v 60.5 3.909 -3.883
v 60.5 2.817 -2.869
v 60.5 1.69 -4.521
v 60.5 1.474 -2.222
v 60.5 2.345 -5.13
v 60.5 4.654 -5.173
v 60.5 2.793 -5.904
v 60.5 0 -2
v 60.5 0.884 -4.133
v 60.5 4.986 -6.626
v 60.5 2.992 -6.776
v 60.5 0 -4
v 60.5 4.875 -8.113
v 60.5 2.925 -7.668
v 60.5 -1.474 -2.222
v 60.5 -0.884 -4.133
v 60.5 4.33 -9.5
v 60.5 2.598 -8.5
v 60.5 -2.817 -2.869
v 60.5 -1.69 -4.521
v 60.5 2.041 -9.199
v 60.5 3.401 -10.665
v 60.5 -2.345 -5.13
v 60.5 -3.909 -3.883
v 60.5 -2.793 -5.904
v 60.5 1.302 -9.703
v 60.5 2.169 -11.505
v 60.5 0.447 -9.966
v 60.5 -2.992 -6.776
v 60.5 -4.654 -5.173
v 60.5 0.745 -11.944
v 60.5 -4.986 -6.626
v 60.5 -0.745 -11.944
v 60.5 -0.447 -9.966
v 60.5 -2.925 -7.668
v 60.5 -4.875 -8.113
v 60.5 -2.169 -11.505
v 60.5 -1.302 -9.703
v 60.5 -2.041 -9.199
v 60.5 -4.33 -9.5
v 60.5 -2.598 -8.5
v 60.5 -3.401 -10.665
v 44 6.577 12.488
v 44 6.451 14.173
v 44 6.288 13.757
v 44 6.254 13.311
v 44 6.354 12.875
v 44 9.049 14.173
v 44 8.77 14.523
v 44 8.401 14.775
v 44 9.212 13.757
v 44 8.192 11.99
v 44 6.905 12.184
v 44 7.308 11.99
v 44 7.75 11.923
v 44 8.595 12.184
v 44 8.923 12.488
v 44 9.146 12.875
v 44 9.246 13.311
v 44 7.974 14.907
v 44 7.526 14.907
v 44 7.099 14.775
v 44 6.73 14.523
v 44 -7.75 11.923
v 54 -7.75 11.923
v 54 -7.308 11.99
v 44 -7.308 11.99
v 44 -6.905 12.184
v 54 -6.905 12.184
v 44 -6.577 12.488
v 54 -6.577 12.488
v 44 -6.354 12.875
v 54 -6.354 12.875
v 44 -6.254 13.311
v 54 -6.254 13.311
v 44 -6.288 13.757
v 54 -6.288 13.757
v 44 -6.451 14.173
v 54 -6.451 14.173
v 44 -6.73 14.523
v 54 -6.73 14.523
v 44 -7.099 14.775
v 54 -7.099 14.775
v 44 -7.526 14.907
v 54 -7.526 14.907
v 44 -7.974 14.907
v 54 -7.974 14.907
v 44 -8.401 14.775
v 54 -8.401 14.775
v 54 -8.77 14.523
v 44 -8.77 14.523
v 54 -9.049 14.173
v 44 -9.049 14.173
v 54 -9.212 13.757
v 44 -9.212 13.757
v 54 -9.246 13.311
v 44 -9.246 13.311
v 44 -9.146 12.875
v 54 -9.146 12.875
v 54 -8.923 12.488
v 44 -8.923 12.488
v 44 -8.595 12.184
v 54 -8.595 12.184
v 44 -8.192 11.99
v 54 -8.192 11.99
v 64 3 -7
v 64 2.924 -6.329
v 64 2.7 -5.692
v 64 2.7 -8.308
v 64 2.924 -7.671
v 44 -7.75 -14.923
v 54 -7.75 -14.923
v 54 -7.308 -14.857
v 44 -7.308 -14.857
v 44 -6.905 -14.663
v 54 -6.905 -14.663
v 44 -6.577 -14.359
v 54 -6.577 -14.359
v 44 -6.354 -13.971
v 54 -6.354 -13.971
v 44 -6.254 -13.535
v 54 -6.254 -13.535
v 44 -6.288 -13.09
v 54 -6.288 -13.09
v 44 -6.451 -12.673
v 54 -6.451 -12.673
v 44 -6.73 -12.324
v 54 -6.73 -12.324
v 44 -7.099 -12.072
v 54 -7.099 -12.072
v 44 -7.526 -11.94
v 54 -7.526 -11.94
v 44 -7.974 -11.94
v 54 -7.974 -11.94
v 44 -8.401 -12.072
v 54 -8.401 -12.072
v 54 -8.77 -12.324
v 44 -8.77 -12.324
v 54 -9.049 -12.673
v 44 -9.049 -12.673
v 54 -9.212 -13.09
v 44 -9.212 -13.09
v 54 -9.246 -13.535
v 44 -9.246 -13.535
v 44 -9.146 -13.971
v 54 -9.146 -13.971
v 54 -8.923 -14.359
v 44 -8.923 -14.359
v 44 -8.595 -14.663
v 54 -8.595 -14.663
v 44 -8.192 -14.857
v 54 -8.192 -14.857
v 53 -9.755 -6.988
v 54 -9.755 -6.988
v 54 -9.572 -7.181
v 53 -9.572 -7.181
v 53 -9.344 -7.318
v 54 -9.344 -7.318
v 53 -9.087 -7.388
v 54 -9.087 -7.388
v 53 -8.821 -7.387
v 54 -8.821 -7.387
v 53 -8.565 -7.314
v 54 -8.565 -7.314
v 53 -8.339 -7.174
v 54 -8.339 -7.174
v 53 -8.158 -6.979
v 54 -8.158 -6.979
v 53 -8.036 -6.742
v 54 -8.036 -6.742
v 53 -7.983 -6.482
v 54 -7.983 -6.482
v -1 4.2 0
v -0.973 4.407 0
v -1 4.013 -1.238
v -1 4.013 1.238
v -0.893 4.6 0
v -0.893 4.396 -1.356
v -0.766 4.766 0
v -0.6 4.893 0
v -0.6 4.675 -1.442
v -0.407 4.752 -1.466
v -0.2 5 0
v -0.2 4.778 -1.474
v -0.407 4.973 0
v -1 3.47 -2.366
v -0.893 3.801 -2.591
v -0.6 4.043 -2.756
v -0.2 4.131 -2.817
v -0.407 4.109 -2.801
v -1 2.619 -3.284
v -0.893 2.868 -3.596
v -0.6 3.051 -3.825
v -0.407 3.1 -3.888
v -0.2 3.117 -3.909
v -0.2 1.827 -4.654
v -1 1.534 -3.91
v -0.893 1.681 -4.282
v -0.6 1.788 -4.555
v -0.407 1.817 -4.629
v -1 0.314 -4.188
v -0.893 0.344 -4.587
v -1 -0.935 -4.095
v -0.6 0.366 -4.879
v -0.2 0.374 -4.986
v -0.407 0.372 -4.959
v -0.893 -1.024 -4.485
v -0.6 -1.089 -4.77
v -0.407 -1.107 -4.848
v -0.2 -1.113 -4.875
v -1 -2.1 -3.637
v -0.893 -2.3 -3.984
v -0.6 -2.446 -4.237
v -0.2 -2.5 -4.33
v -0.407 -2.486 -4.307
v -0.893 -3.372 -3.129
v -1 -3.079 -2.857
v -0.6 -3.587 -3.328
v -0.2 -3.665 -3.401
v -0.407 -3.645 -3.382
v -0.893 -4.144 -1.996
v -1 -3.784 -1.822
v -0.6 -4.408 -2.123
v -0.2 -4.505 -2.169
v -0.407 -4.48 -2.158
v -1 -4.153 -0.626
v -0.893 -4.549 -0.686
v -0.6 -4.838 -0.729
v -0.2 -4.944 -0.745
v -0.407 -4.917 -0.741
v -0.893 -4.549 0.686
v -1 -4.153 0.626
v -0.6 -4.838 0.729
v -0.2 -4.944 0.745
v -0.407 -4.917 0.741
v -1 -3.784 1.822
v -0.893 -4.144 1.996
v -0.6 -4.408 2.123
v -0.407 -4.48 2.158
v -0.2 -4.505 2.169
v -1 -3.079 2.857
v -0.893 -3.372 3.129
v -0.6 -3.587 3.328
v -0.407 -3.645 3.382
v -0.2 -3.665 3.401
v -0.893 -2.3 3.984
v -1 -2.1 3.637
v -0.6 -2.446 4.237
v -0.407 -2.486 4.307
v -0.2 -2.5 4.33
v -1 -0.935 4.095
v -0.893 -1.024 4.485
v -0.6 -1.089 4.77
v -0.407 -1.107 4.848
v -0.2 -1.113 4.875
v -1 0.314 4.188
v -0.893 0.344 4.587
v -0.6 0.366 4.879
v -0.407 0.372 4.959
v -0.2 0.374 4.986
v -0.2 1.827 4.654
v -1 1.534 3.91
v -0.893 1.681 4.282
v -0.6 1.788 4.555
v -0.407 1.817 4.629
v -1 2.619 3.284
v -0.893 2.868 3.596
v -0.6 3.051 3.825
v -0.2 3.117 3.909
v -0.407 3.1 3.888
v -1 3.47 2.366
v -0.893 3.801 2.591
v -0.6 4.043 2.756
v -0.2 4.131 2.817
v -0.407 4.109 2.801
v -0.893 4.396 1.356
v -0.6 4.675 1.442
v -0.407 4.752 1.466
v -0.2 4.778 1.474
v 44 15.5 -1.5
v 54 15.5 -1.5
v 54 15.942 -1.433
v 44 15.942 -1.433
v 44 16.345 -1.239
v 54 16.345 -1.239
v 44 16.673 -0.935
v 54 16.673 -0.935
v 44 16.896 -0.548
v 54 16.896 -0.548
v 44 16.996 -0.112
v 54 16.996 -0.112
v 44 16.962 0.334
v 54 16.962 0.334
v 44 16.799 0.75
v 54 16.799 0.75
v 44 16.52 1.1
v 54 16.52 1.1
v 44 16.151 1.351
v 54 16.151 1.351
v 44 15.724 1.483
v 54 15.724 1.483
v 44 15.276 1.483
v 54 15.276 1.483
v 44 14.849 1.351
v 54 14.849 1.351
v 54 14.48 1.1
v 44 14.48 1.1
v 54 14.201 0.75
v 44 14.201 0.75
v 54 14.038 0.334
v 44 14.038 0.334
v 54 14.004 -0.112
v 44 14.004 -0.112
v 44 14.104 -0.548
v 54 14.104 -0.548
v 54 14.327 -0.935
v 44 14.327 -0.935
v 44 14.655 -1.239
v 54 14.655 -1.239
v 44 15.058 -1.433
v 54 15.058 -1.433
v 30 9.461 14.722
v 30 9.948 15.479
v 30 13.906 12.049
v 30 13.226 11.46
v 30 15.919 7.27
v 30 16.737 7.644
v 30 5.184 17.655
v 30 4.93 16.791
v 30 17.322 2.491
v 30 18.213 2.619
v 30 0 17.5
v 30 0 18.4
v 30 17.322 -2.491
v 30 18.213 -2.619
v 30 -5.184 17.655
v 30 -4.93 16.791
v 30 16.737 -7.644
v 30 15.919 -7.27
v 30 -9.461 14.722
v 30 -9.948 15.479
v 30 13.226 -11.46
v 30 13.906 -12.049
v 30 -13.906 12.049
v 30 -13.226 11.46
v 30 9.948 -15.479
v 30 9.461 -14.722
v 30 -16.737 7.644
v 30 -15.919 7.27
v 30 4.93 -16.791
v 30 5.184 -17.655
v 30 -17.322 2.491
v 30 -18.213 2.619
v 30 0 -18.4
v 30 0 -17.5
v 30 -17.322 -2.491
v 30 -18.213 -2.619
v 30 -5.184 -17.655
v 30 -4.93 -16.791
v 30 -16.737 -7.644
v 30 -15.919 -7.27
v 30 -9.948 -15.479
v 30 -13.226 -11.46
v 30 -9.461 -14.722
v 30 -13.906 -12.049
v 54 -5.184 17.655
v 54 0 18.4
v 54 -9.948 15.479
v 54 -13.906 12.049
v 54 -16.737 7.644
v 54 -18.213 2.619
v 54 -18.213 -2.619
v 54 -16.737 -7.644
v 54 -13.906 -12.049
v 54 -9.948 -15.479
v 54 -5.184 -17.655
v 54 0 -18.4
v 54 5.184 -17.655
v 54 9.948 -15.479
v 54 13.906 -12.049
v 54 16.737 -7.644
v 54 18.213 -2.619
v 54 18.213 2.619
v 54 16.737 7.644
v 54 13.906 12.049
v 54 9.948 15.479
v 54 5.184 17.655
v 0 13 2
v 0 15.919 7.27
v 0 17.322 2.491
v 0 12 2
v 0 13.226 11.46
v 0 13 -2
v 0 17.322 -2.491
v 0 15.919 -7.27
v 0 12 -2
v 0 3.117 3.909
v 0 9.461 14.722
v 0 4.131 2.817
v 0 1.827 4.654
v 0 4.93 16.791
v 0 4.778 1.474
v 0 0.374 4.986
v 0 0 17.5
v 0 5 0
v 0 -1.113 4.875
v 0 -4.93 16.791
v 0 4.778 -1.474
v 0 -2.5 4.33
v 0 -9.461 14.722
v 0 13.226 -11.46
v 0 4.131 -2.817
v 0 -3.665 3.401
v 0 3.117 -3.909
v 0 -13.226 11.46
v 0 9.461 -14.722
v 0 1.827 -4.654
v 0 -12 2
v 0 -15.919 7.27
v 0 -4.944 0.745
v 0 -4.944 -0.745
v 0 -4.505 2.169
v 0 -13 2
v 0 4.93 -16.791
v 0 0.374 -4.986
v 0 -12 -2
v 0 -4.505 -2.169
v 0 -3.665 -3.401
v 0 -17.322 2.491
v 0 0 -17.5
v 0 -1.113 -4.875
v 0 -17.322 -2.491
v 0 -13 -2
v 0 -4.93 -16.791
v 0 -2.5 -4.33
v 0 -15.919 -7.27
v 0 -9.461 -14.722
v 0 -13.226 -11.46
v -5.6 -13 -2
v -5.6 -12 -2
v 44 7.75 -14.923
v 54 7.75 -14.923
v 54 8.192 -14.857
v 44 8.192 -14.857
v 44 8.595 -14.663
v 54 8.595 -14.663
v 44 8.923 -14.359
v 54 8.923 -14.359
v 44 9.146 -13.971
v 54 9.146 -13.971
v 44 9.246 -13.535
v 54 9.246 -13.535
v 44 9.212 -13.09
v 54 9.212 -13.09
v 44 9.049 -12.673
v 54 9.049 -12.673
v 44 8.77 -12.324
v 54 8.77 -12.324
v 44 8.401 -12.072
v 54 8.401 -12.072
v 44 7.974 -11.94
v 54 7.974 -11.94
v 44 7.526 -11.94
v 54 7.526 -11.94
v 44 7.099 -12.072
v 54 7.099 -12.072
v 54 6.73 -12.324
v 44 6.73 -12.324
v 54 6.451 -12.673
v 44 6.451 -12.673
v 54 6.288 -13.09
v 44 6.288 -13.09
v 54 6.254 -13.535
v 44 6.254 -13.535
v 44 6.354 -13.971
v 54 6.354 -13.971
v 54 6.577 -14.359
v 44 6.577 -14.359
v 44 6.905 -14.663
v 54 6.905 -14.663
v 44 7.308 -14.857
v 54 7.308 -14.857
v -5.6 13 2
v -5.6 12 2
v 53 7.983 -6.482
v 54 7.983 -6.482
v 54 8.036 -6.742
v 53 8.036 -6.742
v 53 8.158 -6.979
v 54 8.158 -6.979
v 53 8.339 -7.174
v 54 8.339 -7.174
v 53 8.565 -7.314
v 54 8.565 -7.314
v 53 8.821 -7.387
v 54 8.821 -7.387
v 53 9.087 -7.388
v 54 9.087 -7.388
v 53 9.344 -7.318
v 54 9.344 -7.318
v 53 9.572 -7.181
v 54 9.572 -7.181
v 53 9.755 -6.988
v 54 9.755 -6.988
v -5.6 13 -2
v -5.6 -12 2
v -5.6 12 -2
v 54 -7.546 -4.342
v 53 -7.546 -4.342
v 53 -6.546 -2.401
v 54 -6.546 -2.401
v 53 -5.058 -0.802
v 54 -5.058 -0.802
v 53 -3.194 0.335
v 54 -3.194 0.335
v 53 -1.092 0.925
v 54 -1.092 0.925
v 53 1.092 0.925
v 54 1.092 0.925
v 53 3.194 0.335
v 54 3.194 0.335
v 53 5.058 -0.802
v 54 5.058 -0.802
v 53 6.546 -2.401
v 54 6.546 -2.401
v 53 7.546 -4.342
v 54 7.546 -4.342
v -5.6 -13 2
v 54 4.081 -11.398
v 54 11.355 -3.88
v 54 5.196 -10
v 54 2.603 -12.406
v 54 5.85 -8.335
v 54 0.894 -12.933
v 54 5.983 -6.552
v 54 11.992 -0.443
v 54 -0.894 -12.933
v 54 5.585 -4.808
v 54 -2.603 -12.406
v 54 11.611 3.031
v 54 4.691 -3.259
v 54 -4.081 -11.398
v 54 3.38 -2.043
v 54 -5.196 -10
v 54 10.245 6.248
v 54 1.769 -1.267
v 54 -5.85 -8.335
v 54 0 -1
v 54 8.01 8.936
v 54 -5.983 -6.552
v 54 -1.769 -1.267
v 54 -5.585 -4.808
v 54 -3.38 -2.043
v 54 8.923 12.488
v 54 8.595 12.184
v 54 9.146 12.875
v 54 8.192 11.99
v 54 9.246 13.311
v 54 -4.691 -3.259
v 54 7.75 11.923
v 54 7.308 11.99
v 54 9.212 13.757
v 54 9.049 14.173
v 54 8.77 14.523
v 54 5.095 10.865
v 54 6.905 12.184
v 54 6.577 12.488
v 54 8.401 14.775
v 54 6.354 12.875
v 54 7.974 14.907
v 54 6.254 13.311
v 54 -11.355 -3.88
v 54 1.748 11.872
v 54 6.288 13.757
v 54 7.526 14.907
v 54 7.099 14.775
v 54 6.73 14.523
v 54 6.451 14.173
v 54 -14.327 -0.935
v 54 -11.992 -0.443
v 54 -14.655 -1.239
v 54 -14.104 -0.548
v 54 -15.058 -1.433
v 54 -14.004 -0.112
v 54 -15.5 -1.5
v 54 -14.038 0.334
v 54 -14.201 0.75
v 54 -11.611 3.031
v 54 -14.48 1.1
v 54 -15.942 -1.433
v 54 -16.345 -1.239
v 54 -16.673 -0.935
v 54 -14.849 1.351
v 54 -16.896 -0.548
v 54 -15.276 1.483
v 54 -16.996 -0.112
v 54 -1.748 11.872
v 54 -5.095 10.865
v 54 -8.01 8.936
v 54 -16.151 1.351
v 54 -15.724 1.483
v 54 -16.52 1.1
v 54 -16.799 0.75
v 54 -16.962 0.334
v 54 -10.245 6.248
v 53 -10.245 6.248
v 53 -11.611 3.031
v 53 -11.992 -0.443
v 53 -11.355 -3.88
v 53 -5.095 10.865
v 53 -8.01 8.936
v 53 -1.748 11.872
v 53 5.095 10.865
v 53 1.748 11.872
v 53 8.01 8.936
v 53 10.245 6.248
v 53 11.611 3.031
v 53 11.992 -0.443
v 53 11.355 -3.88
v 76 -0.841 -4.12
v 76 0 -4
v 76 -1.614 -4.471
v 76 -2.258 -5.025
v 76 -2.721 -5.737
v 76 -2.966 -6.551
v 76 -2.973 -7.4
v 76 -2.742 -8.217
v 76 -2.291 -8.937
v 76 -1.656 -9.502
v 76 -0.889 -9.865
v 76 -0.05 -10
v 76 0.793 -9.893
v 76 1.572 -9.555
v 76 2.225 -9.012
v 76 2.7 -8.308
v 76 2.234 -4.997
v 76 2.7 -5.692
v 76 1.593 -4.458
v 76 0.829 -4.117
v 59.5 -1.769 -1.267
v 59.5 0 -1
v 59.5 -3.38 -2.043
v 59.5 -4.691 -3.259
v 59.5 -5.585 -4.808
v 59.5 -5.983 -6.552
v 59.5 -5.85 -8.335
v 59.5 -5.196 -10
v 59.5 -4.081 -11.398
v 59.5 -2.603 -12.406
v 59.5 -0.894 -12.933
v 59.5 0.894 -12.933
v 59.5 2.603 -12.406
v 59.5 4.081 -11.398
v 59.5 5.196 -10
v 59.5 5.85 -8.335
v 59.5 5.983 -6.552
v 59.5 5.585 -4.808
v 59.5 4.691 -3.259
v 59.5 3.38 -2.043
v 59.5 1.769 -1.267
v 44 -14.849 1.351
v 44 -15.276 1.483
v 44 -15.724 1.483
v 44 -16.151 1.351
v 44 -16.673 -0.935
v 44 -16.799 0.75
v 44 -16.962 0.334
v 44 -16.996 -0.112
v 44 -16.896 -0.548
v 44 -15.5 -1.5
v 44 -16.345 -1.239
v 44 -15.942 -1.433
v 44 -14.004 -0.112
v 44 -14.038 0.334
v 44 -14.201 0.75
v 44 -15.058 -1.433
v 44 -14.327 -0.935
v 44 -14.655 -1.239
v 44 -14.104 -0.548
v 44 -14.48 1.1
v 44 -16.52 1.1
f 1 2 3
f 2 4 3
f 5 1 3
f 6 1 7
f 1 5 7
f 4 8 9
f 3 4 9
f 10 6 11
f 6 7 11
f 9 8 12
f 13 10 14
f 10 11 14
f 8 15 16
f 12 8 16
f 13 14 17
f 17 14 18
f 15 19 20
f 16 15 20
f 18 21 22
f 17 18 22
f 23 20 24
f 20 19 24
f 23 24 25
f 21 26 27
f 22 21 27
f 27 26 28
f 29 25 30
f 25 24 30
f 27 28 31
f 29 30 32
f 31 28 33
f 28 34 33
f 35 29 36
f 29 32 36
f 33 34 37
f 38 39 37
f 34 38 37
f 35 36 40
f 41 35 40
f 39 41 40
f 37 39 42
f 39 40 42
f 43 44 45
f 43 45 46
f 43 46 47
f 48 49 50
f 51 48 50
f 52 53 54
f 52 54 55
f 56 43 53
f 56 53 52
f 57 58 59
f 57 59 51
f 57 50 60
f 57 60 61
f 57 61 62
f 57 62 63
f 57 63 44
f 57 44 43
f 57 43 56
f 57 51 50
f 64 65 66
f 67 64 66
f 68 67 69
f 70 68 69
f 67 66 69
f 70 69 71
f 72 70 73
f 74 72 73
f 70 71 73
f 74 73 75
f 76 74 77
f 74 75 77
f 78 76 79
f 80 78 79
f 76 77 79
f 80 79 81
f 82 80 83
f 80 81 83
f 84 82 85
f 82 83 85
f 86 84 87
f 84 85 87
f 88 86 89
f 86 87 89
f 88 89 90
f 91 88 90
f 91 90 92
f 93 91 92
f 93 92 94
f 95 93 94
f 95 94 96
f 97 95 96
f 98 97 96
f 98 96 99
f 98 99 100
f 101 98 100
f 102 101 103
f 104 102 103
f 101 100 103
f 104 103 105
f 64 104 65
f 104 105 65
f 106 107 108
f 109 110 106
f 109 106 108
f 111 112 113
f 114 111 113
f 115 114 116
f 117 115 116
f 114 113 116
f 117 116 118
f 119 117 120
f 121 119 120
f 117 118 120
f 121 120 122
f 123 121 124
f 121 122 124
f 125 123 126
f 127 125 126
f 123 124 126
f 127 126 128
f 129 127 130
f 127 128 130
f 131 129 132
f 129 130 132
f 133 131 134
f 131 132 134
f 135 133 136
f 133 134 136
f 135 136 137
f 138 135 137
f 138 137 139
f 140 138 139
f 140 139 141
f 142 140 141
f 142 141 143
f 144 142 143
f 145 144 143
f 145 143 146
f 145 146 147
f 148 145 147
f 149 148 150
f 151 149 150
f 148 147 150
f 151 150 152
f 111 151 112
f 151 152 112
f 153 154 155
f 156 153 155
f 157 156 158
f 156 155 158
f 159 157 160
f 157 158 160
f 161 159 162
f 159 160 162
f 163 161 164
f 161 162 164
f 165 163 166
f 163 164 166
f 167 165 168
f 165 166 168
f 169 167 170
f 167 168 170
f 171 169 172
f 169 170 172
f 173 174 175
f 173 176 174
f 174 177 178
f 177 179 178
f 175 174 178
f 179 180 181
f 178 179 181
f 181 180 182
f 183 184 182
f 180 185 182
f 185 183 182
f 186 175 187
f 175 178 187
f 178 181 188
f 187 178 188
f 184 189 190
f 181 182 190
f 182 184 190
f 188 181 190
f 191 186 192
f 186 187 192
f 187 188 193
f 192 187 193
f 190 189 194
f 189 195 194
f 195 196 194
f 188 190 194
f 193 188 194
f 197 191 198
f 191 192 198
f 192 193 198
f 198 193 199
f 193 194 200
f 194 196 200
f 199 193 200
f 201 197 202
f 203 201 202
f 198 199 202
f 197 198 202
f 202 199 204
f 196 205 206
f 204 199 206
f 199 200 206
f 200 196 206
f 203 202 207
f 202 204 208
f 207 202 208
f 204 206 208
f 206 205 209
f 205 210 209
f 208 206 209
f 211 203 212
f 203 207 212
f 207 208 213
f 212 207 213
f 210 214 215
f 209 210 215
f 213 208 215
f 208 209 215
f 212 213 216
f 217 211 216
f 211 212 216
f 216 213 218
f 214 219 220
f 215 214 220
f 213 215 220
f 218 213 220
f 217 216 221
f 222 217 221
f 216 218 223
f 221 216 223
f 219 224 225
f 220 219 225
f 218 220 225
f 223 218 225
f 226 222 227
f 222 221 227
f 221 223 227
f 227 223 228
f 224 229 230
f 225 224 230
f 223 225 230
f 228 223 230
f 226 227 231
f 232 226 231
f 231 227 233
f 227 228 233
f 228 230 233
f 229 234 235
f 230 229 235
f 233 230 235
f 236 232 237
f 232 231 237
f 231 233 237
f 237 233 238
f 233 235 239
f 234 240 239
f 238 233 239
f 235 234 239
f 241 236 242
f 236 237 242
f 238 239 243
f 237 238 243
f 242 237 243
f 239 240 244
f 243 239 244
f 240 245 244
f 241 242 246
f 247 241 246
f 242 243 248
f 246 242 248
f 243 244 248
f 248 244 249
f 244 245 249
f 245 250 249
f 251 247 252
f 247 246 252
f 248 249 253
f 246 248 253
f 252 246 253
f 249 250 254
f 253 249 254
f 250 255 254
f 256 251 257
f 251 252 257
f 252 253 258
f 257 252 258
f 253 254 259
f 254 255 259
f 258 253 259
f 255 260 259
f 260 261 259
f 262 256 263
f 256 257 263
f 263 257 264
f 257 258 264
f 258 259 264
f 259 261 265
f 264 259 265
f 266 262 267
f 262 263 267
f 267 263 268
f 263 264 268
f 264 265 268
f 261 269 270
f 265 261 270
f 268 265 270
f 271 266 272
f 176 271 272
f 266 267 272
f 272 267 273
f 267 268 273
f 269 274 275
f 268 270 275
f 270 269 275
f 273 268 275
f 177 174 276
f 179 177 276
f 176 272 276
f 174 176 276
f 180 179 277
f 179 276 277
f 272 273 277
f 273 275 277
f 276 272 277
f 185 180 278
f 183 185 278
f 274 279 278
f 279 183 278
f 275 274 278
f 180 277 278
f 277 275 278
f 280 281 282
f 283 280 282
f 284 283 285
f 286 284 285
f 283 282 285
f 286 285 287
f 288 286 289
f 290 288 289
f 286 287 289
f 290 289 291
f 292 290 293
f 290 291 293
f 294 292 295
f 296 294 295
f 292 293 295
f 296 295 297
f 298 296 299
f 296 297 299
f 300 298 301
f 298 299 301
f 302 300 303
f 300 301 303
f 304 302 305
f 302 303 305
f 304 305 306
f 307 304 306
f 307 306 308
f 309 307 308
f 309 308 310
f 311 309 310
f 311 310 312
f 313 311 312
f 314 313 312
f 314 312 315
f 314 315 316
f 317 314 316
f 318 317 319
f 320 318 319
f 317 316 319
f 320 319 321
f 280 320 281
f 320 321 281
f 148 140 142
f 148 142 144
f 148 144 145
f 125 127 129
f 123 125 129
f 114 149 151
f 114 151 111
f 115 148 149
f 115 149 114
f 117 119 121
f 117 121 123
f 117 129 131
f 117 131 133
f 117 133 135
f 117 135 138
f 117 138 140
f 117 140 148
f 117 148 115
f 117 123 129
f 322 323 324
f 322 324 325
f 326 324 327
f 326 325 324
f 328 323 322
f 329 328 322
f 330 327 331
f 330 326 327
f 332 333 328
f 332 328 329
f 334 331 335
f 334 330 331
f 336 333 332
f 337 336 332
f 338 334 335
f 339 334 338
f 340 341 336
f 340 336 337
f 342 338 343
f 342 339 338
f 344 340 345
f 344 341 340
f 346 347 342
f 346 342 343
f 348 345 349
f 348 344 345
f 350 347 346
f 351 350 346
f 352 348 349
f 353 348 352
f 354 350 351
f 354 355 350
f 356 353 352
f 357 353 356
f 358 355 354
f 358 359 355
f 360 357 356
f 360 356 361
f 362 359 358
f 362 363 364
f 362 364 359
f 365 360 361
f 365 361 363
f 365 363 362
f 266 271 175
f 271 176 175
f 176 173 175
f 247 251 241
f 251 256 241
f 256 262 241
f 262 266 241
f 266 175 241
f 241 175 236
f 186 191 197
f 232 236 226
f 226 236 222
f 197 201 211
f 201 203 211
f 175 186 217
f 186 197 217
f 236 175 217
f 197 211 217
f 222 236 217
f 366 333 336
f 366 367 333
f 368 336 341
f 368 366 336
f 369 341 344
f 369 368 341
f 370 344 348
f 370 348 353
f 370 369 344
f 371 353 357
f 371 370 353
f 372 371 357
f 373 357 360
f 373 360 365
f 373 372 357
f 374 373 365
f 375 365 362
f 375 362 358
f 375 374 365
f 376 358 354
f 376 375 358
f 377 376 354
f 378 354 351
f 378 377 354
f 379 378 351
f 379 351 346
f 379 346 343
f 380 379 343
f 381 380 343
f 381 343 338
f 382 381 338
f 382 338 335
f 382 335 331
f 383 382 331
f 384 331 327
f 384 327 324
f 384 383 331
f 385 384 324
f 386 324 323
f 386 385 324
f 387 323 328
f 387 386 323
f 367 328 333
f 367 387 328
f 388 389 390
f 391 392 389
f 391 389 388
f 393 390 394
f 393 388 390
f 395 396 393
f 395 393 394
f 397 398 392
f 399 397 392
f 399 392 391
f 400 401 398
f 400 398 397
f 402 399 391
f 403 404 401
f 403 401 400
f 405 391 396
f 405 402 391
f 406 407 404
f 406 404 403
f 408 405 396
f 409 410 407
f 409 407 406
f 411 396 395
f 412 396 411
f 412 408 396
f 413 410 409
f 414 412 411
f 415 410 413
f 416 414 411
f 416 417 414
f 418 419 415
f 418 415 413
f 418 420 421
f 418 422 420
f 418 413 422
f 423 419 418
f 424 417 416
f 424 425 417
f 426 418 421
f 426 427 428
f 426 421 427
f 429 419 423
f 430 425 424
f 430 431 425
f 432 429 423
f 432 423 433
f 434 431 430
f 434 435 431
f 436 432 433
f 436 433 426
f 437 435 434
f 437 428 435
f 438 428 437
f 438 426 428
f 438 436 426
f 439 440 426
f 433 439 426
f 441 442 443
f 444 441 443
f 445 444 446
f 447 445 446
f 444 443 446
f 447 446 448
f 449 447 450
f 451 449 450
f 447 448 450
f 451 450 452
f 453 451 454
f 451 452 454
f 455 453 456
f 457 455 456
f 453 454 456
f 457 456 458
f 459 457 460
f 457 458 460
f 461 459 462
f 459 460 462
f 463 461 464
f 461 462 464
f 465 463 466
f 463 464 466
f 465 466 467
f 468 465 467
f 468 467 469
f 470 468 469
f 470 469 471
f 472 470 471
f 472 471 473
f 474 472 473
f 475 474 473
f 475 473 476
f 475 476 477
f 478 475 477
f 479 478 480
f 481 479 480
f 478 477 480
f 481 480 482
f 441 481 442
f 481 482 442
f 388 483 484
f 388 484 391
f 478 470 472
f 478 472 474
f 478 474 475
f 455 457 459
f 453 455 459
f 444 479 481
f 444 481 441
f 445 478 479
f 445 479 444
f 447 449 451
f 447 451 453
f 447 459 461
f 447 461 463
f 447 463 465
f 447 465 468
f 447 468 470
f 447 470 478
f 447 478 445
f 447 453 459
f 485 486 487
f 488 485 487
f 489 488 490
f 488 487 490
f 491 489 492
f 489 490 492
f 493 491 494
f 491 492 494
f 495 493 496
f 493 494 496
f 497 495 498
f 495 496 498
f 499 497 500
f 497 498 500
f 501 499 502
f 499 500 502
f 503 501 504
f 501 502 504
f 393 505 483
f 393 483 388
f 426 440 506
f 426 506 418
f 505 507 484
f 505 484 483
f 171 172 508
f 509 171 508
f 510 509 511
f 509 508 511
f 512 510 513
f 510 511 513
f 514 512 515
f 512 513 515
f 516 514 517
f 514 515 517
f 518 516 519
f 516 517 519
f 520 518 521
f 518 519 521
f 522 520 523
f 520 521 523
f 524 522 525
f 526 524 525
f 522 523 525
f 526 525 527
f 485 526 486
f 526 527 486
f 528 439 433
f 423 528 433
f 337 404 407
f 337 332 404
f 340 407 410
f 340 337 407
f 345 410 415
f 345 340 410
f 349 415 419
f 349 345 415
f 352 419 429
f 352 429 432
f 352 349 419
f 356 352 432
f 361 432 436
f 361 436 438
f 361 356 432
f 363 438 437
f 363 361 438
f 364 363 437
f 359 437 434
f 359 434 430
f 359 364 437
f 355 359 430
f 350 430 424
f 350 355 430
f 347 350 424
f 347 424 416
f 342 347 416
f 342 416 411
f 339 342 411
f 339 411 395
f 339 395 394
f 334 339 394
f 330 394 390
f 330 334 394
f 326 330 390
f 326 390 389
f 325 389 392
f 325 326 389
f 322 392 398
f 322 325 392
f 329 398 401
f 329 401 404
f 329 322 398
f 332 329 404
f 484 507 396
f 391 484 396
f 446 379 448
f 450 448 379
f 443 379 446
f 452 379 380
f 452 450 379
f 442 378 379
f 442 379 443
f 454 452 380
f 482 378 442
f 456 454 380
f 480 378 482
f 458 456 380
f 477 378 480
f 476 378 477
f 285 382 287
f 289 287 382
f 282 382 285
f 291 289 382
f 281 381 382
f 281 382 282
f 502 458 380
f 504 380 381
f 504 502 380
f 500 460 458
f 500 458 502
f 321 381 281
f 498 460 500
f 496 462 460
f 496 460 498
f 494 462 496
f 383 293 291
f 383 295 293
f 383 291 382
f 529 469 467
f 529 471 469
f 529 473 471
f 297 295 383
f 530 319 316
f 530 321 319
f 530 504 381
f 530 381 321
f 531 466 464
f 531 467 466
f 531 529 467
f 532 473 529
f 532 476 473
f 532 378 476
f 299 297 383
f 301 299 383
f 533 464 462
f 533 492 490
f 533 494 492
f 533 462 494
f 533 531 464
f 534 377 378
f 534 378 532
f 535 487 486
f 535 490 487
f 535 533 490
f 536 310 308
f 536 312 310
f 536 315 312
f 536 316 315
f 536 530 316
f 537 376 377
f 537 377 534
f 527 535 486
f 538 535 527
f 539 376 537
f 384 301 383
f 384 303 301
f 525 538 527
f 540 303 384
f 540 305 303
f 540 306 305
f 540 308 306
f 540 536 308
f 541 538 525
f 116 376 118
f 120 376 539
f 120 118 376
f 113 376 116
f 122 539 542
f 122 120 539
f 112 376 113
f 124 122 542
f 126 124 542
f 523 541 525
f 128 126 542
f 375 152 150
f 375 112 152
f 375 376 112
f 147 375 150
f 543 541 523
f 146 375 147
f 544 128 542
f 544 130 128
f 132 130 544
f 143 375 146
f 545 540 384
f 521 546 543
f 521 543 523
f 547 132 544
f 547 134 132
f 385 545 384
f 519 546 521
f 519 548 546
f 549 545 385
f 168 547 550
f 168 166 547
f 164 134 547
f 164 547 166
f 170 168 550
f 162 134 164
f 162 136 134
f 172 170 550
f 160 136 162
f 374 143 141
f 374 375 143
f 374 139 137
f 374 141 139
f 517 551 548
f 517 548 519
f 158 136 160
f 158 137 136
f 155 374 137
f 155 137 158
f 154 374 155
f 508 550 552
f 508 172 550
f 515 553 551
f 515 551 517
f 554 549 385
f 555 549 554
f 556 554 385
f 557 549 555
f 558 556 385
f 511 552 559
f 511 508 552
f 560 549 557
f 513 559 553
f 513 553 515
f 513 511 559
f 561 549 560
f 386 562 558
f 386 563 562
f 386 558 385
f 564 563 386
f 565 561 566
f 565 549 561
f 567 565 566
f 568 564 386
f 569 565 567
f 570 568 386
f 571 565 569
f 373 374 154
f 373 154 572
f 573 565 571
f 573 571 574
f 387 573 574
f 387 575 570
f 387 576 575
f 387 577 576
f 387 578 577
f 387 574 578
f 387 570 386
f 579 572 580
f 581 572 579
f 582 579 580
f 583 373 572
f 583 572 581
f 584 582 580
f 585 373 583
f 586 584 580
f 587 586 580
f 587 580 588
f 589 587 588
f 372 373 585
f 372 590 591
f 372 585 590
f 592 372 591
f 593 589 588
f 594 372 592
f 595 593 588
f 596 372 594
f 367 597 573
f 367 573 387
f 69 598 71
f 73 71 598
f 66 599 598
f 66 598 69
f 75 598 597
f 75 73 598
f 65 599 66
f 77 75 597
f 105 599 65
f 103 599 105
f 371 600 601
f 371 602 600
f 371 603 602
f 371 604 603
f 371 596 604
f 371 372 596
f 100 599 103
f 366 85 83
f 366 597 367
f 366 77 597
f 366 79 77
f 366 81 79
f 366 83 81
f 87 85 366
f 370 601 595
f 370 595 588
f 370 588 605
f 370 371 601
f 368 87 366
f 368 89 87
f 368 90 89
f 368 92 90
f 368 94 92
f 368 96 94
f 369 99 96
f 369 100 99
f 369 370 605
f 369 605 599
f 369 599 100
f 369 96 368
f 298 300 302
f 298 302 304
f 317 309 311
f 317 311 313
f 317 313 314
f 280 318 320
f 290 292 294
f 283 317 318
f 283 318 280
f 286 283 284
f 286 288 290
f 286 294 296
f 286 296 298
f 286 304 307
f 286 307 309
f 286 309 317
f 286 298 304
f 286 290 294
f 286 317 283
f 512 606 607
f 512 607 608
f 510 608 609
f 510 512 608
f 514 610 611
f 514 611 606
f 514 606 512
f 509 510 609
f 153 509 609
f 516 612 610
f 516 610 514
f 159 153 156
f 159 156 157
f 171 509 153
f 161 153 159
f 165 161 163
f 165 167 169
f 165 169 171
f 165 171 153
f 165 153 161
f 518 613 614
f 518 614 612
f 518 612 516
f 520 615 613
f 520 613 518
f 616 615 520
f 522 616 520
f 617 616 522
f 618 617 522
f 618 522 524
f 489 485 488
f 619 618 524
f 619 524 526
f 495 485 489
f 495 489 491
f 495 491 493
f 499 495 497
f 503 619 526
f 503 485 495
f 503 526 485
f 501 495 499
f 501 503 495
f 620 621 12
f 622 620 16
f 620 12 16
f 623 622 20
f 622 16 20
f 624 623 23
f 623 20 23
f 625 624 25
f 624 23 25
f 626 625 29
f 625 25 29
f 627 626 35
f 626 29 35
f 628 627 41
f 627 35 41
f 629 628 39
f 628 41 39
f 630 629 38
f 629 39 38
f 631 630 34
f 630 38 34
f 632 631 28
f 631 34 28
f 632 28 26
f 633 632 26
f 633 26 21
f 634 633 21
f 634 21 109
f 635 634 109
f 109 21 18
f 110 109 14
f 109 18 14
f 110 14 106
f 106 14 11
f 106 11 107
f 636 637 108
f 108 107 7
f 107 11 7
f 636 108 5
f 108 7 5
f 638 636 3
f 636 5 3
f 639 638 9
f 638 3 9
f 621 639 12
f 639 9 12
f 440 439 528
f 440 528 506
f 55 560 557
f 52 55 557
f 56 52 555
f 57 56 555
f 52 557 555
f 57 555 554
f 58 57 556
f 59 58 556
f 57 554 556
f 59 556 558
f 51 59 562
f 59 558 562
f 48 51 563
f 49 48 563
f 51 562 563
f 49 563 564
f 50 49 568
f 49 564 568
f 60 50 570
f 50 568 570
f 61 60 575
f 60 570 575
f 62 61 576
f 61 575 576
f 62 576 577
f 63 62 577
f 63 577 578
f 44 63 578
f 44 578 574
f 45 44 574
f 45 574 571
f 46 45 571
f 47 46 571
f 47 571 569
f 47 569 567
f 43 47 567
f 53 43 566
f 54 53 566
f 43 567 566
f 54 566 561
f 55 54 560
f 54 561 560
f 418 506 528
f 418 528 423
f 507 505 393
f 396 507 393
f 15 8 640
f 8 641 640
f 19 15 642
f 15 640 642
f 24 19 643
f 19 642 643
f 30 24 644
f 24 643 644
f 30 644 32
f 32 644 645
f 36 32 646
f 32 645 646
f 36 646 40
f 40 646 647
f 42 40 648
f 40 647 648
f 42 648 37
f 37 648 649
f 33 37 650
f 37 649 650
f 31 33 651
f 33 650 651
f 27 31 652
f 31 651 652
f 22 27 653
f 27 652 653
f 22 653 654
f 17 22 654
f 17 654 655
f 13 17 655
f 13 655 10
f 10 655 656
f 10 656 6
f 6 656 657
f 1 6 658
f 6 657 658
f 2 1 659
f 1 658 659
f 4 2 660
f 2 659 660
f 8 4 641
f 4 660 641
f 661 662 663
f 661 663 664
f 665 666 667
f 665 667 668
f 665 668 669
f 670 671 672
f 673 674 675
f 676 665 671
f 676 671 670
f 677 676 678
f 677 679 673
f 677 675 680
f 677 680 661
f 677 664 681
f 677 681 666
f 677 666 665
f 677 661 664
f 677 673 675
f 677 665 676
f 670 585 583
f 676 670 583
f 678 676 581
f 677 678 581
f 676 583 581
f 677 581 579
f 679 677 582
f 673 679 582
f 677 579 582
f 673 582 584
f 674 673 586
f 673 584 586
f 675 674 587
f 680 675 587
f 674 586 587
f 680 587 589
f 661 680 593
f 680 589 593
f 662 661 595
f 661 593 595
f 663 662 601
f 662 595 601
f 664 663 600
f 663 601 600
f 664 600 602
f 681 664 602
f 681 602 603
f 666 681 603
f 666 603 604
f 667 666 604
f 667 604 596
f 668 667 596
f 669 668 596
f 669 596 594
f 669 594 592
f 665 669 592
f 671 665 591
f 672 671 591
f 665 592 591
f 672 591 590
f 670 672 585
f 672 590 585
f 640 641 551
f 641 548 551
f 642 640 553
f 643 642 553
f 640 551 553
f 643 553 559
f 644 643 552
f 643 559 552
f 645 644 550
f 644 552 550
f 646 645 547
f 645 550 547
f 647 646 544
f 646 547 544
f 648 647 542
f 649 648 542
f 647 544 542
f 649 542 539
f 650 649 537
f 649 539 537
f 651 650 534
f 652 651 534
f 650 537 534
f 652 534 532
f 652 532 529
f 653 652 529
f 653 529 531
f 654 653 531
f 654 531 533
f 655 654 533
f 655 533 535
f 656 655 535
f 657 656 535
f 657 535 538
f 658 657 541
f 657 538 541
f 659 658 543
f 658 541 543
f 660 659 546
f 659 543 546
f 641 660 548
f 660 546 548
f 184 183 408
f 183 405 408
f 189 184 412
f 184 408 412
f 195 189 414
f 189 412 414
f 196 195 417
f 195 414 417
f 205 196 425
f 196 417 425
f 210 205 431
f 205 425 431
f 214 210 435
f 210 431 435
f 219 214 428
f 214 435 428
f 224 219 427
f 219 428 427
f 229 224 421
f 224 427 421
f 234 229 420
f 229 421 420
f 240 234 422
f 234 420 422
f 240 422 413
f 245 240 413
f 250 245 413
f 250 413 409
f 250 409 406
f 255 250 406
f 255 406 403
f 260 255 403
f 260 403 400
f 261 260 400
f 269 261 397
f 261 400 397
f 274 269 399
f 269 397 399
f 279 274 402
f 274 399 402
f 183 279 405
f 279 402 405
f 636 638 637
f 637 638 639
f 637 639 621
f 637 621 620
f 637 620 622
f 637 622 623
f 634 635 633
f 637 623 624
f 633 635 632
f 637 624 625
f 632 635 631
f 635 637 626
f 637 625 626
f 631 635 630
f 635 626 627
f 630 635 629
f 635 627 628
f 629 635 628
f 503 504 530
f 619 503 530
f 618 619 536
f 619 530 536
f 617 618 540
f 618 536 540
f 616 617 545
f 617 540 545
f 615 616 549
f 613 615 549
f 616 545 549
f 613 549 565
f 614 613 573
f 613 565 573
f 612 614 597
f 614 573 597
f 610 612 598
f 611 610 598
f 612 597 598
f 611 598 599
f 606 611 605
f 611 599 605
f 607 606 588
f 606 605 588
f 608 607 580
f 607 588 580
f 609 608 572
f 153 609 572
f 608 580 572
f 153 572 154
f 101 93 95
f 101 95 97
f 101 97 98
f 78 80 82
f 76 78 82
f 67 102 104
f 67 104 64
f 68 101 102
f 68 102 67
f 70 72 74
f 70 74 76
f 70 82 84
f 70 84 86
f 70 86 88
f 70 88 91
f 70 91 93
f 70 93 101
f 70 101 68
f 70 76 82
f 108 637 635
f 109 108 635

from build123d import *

# Parameters (mm, degrees)
ESQUISSE2_R             = 1.5
ENL_V_MAT_EXTRU_1_DEPTH = 10
ENL_V_MAT_EXTRU_2_DEPTH = 1
BOSS_EXTRU_2_DEPTH      = 2
BOSS_EXTRU_2_DEPTH_BACK = 2
ESQUISSE7_W             = 5.6
ESQUISSE7_H             = 1
ESQUISSE9_OUTSIDE_W     = 58.156
ESQUISSE9_OUTSIDE_H     = 58.156
ENL_V_MAT_EXTRU_3_DEPTH = 12


with BuildPart() as part:
    # Esquisse1 → Révolution1 (revolve)
    with BuildSketch(Plane.XY):
        Polygon((30, 17.5), (30, 18.4), (54, 18.4), (54, 0), (0, 0), (0, 17.5), align=None)
    revolve(axis=Axis((0, 0, 0), (1, 0, 0)))

    # Esquisse2 → Enlèv. mat.-Extru.1 (cut)
    with BuildSketch(Plane(origin=(54, 0, 0), x_dir=(0, 0, -1), z_dir=(1, 0, 0))):
        with Locations((0, 15.5)):
            Circle(ESQUISSE2_R)
        with Locations((13.423393759, 7.75)):
            Circle(ESQUISSE2_R)
        with Locations((13.423393759, -7.75)):
            Circle(ESQUISSE2_R)
        with Locations((0, -15.5)):
            Circle(ESQUISSE2_R)
        with Locations((-13.423393759, -7.75)):
            Circle(ESQUISSE2_R)
        with Locations((-13.423393759, 7.75)):
            Circle(ESQUISSE2_R)
    extrude(amount=-ENL_V_MAT_EXTRU_1_DEPTH, mode=Mode.SUBTRACT)

    # Esquisse5 → Révolution2 (revolve)
    with BuildSketch(Plane(origin=(0, 0, 0), x_dir=(1, 0, 0), z_dir=(0, 1, 0))):
        Polygon((54, 7), (76, 7), (76, 10), (60.5, 10), (60.5, 12), (59.5, 13), (54, 13), align=None)
    revolve(axis=Axis((54, 0, -7), (1, 0, 0)))

    # Esquisse6 → Enlèv. mat.-Extru.2 (cut)
    with BuildSketch(Plane(origin=(54, 0, 0), x_dir=(0, 0, -1), z_dir=(1, 0, 0))):
        with BuildLine():
            ThreePointArc((6.98802926, 9.755380416), (-12, 0), (6.98802926, -9.755380416))
            ThreePointArc((6.98802926, -9.755380416), (7.3591047, -8.690855421), (6.481545758, -7.983182649))
            ThreePointArc((6.481545758, -7.983182649), (-1, 0), (6.481545758, 7.983182649))
            ThreePointArc((6.481545758, 7.983182649), (7.3591047, 8.690855421), (6.98802926, 9.755380416))
        make_face()
    extrude(amount=-ENL_V_MAT_EXTRU_2_DEPTH, mode=Mode.SUBTRACT)

    # Esquisse7 → Boss.-Extru.2 (add, two sides: drawn at the far end of the back side and taken through both)
    with BuildSketch(Plane.XY.offset(-BOSS_EXTRU_2_DEPTH_BACK)):
        with Locations((-2.8, 12.5)):
            Rectangle(ESQUISSE7_W, ESQUISSE7_H)
        with Locations((-2.8, -12.5)):
            Rectangle(ESQUISSE7_W, ESQUISSE7_H)
    extrude(amount=BOSS_EXTRU_2_DEPTH + BOSS_EXTRU_2_DEPTH_BACK)

    # Esquisse8 → Révolution3 (revolve)
    with BuildSketch(Plane.XY):
        with BuildLine():
            Line((0, 0), (-1, 0))
            Line((-1, 0), (-1, 4.2))
            ThreePointArc((-1, 4.2), (-0.765685425, 4.765685425), (-0.2, 5))
            Line((-0.2, 5), (0, 5))
            Line((0, 5), (0, 0))
        make_face()
    revolve(axis=Axis((0, 0, 0), (-1, 0, 0)))

    # Esquisse9 outside → Enlèv. mat.-Extru.3 (cut)
    with BuildSketch(Plane(origin=(76, 0, 0), x_dir=(0, 0, -1), z_dir=(1, 0, 0))):
        Rectangle(ESQUISSE9_OUTSIDE_W, ESQUISSE9_OUTSIDE_H)
        with BuildLine():
            Line((5.692330317, 2.7), (8.307669683, 2.7))
            ThreePointArc((8.307669683, 2.7), (7, -3), (5.692330317, 2.7))
        make_face(mode=Mode.SUBTRACT)
    extrude(amount=-ENL_V_MAT_EXTRU_3_DEPTH, mode=Mode.SUBTRACT)


solid = part.part
